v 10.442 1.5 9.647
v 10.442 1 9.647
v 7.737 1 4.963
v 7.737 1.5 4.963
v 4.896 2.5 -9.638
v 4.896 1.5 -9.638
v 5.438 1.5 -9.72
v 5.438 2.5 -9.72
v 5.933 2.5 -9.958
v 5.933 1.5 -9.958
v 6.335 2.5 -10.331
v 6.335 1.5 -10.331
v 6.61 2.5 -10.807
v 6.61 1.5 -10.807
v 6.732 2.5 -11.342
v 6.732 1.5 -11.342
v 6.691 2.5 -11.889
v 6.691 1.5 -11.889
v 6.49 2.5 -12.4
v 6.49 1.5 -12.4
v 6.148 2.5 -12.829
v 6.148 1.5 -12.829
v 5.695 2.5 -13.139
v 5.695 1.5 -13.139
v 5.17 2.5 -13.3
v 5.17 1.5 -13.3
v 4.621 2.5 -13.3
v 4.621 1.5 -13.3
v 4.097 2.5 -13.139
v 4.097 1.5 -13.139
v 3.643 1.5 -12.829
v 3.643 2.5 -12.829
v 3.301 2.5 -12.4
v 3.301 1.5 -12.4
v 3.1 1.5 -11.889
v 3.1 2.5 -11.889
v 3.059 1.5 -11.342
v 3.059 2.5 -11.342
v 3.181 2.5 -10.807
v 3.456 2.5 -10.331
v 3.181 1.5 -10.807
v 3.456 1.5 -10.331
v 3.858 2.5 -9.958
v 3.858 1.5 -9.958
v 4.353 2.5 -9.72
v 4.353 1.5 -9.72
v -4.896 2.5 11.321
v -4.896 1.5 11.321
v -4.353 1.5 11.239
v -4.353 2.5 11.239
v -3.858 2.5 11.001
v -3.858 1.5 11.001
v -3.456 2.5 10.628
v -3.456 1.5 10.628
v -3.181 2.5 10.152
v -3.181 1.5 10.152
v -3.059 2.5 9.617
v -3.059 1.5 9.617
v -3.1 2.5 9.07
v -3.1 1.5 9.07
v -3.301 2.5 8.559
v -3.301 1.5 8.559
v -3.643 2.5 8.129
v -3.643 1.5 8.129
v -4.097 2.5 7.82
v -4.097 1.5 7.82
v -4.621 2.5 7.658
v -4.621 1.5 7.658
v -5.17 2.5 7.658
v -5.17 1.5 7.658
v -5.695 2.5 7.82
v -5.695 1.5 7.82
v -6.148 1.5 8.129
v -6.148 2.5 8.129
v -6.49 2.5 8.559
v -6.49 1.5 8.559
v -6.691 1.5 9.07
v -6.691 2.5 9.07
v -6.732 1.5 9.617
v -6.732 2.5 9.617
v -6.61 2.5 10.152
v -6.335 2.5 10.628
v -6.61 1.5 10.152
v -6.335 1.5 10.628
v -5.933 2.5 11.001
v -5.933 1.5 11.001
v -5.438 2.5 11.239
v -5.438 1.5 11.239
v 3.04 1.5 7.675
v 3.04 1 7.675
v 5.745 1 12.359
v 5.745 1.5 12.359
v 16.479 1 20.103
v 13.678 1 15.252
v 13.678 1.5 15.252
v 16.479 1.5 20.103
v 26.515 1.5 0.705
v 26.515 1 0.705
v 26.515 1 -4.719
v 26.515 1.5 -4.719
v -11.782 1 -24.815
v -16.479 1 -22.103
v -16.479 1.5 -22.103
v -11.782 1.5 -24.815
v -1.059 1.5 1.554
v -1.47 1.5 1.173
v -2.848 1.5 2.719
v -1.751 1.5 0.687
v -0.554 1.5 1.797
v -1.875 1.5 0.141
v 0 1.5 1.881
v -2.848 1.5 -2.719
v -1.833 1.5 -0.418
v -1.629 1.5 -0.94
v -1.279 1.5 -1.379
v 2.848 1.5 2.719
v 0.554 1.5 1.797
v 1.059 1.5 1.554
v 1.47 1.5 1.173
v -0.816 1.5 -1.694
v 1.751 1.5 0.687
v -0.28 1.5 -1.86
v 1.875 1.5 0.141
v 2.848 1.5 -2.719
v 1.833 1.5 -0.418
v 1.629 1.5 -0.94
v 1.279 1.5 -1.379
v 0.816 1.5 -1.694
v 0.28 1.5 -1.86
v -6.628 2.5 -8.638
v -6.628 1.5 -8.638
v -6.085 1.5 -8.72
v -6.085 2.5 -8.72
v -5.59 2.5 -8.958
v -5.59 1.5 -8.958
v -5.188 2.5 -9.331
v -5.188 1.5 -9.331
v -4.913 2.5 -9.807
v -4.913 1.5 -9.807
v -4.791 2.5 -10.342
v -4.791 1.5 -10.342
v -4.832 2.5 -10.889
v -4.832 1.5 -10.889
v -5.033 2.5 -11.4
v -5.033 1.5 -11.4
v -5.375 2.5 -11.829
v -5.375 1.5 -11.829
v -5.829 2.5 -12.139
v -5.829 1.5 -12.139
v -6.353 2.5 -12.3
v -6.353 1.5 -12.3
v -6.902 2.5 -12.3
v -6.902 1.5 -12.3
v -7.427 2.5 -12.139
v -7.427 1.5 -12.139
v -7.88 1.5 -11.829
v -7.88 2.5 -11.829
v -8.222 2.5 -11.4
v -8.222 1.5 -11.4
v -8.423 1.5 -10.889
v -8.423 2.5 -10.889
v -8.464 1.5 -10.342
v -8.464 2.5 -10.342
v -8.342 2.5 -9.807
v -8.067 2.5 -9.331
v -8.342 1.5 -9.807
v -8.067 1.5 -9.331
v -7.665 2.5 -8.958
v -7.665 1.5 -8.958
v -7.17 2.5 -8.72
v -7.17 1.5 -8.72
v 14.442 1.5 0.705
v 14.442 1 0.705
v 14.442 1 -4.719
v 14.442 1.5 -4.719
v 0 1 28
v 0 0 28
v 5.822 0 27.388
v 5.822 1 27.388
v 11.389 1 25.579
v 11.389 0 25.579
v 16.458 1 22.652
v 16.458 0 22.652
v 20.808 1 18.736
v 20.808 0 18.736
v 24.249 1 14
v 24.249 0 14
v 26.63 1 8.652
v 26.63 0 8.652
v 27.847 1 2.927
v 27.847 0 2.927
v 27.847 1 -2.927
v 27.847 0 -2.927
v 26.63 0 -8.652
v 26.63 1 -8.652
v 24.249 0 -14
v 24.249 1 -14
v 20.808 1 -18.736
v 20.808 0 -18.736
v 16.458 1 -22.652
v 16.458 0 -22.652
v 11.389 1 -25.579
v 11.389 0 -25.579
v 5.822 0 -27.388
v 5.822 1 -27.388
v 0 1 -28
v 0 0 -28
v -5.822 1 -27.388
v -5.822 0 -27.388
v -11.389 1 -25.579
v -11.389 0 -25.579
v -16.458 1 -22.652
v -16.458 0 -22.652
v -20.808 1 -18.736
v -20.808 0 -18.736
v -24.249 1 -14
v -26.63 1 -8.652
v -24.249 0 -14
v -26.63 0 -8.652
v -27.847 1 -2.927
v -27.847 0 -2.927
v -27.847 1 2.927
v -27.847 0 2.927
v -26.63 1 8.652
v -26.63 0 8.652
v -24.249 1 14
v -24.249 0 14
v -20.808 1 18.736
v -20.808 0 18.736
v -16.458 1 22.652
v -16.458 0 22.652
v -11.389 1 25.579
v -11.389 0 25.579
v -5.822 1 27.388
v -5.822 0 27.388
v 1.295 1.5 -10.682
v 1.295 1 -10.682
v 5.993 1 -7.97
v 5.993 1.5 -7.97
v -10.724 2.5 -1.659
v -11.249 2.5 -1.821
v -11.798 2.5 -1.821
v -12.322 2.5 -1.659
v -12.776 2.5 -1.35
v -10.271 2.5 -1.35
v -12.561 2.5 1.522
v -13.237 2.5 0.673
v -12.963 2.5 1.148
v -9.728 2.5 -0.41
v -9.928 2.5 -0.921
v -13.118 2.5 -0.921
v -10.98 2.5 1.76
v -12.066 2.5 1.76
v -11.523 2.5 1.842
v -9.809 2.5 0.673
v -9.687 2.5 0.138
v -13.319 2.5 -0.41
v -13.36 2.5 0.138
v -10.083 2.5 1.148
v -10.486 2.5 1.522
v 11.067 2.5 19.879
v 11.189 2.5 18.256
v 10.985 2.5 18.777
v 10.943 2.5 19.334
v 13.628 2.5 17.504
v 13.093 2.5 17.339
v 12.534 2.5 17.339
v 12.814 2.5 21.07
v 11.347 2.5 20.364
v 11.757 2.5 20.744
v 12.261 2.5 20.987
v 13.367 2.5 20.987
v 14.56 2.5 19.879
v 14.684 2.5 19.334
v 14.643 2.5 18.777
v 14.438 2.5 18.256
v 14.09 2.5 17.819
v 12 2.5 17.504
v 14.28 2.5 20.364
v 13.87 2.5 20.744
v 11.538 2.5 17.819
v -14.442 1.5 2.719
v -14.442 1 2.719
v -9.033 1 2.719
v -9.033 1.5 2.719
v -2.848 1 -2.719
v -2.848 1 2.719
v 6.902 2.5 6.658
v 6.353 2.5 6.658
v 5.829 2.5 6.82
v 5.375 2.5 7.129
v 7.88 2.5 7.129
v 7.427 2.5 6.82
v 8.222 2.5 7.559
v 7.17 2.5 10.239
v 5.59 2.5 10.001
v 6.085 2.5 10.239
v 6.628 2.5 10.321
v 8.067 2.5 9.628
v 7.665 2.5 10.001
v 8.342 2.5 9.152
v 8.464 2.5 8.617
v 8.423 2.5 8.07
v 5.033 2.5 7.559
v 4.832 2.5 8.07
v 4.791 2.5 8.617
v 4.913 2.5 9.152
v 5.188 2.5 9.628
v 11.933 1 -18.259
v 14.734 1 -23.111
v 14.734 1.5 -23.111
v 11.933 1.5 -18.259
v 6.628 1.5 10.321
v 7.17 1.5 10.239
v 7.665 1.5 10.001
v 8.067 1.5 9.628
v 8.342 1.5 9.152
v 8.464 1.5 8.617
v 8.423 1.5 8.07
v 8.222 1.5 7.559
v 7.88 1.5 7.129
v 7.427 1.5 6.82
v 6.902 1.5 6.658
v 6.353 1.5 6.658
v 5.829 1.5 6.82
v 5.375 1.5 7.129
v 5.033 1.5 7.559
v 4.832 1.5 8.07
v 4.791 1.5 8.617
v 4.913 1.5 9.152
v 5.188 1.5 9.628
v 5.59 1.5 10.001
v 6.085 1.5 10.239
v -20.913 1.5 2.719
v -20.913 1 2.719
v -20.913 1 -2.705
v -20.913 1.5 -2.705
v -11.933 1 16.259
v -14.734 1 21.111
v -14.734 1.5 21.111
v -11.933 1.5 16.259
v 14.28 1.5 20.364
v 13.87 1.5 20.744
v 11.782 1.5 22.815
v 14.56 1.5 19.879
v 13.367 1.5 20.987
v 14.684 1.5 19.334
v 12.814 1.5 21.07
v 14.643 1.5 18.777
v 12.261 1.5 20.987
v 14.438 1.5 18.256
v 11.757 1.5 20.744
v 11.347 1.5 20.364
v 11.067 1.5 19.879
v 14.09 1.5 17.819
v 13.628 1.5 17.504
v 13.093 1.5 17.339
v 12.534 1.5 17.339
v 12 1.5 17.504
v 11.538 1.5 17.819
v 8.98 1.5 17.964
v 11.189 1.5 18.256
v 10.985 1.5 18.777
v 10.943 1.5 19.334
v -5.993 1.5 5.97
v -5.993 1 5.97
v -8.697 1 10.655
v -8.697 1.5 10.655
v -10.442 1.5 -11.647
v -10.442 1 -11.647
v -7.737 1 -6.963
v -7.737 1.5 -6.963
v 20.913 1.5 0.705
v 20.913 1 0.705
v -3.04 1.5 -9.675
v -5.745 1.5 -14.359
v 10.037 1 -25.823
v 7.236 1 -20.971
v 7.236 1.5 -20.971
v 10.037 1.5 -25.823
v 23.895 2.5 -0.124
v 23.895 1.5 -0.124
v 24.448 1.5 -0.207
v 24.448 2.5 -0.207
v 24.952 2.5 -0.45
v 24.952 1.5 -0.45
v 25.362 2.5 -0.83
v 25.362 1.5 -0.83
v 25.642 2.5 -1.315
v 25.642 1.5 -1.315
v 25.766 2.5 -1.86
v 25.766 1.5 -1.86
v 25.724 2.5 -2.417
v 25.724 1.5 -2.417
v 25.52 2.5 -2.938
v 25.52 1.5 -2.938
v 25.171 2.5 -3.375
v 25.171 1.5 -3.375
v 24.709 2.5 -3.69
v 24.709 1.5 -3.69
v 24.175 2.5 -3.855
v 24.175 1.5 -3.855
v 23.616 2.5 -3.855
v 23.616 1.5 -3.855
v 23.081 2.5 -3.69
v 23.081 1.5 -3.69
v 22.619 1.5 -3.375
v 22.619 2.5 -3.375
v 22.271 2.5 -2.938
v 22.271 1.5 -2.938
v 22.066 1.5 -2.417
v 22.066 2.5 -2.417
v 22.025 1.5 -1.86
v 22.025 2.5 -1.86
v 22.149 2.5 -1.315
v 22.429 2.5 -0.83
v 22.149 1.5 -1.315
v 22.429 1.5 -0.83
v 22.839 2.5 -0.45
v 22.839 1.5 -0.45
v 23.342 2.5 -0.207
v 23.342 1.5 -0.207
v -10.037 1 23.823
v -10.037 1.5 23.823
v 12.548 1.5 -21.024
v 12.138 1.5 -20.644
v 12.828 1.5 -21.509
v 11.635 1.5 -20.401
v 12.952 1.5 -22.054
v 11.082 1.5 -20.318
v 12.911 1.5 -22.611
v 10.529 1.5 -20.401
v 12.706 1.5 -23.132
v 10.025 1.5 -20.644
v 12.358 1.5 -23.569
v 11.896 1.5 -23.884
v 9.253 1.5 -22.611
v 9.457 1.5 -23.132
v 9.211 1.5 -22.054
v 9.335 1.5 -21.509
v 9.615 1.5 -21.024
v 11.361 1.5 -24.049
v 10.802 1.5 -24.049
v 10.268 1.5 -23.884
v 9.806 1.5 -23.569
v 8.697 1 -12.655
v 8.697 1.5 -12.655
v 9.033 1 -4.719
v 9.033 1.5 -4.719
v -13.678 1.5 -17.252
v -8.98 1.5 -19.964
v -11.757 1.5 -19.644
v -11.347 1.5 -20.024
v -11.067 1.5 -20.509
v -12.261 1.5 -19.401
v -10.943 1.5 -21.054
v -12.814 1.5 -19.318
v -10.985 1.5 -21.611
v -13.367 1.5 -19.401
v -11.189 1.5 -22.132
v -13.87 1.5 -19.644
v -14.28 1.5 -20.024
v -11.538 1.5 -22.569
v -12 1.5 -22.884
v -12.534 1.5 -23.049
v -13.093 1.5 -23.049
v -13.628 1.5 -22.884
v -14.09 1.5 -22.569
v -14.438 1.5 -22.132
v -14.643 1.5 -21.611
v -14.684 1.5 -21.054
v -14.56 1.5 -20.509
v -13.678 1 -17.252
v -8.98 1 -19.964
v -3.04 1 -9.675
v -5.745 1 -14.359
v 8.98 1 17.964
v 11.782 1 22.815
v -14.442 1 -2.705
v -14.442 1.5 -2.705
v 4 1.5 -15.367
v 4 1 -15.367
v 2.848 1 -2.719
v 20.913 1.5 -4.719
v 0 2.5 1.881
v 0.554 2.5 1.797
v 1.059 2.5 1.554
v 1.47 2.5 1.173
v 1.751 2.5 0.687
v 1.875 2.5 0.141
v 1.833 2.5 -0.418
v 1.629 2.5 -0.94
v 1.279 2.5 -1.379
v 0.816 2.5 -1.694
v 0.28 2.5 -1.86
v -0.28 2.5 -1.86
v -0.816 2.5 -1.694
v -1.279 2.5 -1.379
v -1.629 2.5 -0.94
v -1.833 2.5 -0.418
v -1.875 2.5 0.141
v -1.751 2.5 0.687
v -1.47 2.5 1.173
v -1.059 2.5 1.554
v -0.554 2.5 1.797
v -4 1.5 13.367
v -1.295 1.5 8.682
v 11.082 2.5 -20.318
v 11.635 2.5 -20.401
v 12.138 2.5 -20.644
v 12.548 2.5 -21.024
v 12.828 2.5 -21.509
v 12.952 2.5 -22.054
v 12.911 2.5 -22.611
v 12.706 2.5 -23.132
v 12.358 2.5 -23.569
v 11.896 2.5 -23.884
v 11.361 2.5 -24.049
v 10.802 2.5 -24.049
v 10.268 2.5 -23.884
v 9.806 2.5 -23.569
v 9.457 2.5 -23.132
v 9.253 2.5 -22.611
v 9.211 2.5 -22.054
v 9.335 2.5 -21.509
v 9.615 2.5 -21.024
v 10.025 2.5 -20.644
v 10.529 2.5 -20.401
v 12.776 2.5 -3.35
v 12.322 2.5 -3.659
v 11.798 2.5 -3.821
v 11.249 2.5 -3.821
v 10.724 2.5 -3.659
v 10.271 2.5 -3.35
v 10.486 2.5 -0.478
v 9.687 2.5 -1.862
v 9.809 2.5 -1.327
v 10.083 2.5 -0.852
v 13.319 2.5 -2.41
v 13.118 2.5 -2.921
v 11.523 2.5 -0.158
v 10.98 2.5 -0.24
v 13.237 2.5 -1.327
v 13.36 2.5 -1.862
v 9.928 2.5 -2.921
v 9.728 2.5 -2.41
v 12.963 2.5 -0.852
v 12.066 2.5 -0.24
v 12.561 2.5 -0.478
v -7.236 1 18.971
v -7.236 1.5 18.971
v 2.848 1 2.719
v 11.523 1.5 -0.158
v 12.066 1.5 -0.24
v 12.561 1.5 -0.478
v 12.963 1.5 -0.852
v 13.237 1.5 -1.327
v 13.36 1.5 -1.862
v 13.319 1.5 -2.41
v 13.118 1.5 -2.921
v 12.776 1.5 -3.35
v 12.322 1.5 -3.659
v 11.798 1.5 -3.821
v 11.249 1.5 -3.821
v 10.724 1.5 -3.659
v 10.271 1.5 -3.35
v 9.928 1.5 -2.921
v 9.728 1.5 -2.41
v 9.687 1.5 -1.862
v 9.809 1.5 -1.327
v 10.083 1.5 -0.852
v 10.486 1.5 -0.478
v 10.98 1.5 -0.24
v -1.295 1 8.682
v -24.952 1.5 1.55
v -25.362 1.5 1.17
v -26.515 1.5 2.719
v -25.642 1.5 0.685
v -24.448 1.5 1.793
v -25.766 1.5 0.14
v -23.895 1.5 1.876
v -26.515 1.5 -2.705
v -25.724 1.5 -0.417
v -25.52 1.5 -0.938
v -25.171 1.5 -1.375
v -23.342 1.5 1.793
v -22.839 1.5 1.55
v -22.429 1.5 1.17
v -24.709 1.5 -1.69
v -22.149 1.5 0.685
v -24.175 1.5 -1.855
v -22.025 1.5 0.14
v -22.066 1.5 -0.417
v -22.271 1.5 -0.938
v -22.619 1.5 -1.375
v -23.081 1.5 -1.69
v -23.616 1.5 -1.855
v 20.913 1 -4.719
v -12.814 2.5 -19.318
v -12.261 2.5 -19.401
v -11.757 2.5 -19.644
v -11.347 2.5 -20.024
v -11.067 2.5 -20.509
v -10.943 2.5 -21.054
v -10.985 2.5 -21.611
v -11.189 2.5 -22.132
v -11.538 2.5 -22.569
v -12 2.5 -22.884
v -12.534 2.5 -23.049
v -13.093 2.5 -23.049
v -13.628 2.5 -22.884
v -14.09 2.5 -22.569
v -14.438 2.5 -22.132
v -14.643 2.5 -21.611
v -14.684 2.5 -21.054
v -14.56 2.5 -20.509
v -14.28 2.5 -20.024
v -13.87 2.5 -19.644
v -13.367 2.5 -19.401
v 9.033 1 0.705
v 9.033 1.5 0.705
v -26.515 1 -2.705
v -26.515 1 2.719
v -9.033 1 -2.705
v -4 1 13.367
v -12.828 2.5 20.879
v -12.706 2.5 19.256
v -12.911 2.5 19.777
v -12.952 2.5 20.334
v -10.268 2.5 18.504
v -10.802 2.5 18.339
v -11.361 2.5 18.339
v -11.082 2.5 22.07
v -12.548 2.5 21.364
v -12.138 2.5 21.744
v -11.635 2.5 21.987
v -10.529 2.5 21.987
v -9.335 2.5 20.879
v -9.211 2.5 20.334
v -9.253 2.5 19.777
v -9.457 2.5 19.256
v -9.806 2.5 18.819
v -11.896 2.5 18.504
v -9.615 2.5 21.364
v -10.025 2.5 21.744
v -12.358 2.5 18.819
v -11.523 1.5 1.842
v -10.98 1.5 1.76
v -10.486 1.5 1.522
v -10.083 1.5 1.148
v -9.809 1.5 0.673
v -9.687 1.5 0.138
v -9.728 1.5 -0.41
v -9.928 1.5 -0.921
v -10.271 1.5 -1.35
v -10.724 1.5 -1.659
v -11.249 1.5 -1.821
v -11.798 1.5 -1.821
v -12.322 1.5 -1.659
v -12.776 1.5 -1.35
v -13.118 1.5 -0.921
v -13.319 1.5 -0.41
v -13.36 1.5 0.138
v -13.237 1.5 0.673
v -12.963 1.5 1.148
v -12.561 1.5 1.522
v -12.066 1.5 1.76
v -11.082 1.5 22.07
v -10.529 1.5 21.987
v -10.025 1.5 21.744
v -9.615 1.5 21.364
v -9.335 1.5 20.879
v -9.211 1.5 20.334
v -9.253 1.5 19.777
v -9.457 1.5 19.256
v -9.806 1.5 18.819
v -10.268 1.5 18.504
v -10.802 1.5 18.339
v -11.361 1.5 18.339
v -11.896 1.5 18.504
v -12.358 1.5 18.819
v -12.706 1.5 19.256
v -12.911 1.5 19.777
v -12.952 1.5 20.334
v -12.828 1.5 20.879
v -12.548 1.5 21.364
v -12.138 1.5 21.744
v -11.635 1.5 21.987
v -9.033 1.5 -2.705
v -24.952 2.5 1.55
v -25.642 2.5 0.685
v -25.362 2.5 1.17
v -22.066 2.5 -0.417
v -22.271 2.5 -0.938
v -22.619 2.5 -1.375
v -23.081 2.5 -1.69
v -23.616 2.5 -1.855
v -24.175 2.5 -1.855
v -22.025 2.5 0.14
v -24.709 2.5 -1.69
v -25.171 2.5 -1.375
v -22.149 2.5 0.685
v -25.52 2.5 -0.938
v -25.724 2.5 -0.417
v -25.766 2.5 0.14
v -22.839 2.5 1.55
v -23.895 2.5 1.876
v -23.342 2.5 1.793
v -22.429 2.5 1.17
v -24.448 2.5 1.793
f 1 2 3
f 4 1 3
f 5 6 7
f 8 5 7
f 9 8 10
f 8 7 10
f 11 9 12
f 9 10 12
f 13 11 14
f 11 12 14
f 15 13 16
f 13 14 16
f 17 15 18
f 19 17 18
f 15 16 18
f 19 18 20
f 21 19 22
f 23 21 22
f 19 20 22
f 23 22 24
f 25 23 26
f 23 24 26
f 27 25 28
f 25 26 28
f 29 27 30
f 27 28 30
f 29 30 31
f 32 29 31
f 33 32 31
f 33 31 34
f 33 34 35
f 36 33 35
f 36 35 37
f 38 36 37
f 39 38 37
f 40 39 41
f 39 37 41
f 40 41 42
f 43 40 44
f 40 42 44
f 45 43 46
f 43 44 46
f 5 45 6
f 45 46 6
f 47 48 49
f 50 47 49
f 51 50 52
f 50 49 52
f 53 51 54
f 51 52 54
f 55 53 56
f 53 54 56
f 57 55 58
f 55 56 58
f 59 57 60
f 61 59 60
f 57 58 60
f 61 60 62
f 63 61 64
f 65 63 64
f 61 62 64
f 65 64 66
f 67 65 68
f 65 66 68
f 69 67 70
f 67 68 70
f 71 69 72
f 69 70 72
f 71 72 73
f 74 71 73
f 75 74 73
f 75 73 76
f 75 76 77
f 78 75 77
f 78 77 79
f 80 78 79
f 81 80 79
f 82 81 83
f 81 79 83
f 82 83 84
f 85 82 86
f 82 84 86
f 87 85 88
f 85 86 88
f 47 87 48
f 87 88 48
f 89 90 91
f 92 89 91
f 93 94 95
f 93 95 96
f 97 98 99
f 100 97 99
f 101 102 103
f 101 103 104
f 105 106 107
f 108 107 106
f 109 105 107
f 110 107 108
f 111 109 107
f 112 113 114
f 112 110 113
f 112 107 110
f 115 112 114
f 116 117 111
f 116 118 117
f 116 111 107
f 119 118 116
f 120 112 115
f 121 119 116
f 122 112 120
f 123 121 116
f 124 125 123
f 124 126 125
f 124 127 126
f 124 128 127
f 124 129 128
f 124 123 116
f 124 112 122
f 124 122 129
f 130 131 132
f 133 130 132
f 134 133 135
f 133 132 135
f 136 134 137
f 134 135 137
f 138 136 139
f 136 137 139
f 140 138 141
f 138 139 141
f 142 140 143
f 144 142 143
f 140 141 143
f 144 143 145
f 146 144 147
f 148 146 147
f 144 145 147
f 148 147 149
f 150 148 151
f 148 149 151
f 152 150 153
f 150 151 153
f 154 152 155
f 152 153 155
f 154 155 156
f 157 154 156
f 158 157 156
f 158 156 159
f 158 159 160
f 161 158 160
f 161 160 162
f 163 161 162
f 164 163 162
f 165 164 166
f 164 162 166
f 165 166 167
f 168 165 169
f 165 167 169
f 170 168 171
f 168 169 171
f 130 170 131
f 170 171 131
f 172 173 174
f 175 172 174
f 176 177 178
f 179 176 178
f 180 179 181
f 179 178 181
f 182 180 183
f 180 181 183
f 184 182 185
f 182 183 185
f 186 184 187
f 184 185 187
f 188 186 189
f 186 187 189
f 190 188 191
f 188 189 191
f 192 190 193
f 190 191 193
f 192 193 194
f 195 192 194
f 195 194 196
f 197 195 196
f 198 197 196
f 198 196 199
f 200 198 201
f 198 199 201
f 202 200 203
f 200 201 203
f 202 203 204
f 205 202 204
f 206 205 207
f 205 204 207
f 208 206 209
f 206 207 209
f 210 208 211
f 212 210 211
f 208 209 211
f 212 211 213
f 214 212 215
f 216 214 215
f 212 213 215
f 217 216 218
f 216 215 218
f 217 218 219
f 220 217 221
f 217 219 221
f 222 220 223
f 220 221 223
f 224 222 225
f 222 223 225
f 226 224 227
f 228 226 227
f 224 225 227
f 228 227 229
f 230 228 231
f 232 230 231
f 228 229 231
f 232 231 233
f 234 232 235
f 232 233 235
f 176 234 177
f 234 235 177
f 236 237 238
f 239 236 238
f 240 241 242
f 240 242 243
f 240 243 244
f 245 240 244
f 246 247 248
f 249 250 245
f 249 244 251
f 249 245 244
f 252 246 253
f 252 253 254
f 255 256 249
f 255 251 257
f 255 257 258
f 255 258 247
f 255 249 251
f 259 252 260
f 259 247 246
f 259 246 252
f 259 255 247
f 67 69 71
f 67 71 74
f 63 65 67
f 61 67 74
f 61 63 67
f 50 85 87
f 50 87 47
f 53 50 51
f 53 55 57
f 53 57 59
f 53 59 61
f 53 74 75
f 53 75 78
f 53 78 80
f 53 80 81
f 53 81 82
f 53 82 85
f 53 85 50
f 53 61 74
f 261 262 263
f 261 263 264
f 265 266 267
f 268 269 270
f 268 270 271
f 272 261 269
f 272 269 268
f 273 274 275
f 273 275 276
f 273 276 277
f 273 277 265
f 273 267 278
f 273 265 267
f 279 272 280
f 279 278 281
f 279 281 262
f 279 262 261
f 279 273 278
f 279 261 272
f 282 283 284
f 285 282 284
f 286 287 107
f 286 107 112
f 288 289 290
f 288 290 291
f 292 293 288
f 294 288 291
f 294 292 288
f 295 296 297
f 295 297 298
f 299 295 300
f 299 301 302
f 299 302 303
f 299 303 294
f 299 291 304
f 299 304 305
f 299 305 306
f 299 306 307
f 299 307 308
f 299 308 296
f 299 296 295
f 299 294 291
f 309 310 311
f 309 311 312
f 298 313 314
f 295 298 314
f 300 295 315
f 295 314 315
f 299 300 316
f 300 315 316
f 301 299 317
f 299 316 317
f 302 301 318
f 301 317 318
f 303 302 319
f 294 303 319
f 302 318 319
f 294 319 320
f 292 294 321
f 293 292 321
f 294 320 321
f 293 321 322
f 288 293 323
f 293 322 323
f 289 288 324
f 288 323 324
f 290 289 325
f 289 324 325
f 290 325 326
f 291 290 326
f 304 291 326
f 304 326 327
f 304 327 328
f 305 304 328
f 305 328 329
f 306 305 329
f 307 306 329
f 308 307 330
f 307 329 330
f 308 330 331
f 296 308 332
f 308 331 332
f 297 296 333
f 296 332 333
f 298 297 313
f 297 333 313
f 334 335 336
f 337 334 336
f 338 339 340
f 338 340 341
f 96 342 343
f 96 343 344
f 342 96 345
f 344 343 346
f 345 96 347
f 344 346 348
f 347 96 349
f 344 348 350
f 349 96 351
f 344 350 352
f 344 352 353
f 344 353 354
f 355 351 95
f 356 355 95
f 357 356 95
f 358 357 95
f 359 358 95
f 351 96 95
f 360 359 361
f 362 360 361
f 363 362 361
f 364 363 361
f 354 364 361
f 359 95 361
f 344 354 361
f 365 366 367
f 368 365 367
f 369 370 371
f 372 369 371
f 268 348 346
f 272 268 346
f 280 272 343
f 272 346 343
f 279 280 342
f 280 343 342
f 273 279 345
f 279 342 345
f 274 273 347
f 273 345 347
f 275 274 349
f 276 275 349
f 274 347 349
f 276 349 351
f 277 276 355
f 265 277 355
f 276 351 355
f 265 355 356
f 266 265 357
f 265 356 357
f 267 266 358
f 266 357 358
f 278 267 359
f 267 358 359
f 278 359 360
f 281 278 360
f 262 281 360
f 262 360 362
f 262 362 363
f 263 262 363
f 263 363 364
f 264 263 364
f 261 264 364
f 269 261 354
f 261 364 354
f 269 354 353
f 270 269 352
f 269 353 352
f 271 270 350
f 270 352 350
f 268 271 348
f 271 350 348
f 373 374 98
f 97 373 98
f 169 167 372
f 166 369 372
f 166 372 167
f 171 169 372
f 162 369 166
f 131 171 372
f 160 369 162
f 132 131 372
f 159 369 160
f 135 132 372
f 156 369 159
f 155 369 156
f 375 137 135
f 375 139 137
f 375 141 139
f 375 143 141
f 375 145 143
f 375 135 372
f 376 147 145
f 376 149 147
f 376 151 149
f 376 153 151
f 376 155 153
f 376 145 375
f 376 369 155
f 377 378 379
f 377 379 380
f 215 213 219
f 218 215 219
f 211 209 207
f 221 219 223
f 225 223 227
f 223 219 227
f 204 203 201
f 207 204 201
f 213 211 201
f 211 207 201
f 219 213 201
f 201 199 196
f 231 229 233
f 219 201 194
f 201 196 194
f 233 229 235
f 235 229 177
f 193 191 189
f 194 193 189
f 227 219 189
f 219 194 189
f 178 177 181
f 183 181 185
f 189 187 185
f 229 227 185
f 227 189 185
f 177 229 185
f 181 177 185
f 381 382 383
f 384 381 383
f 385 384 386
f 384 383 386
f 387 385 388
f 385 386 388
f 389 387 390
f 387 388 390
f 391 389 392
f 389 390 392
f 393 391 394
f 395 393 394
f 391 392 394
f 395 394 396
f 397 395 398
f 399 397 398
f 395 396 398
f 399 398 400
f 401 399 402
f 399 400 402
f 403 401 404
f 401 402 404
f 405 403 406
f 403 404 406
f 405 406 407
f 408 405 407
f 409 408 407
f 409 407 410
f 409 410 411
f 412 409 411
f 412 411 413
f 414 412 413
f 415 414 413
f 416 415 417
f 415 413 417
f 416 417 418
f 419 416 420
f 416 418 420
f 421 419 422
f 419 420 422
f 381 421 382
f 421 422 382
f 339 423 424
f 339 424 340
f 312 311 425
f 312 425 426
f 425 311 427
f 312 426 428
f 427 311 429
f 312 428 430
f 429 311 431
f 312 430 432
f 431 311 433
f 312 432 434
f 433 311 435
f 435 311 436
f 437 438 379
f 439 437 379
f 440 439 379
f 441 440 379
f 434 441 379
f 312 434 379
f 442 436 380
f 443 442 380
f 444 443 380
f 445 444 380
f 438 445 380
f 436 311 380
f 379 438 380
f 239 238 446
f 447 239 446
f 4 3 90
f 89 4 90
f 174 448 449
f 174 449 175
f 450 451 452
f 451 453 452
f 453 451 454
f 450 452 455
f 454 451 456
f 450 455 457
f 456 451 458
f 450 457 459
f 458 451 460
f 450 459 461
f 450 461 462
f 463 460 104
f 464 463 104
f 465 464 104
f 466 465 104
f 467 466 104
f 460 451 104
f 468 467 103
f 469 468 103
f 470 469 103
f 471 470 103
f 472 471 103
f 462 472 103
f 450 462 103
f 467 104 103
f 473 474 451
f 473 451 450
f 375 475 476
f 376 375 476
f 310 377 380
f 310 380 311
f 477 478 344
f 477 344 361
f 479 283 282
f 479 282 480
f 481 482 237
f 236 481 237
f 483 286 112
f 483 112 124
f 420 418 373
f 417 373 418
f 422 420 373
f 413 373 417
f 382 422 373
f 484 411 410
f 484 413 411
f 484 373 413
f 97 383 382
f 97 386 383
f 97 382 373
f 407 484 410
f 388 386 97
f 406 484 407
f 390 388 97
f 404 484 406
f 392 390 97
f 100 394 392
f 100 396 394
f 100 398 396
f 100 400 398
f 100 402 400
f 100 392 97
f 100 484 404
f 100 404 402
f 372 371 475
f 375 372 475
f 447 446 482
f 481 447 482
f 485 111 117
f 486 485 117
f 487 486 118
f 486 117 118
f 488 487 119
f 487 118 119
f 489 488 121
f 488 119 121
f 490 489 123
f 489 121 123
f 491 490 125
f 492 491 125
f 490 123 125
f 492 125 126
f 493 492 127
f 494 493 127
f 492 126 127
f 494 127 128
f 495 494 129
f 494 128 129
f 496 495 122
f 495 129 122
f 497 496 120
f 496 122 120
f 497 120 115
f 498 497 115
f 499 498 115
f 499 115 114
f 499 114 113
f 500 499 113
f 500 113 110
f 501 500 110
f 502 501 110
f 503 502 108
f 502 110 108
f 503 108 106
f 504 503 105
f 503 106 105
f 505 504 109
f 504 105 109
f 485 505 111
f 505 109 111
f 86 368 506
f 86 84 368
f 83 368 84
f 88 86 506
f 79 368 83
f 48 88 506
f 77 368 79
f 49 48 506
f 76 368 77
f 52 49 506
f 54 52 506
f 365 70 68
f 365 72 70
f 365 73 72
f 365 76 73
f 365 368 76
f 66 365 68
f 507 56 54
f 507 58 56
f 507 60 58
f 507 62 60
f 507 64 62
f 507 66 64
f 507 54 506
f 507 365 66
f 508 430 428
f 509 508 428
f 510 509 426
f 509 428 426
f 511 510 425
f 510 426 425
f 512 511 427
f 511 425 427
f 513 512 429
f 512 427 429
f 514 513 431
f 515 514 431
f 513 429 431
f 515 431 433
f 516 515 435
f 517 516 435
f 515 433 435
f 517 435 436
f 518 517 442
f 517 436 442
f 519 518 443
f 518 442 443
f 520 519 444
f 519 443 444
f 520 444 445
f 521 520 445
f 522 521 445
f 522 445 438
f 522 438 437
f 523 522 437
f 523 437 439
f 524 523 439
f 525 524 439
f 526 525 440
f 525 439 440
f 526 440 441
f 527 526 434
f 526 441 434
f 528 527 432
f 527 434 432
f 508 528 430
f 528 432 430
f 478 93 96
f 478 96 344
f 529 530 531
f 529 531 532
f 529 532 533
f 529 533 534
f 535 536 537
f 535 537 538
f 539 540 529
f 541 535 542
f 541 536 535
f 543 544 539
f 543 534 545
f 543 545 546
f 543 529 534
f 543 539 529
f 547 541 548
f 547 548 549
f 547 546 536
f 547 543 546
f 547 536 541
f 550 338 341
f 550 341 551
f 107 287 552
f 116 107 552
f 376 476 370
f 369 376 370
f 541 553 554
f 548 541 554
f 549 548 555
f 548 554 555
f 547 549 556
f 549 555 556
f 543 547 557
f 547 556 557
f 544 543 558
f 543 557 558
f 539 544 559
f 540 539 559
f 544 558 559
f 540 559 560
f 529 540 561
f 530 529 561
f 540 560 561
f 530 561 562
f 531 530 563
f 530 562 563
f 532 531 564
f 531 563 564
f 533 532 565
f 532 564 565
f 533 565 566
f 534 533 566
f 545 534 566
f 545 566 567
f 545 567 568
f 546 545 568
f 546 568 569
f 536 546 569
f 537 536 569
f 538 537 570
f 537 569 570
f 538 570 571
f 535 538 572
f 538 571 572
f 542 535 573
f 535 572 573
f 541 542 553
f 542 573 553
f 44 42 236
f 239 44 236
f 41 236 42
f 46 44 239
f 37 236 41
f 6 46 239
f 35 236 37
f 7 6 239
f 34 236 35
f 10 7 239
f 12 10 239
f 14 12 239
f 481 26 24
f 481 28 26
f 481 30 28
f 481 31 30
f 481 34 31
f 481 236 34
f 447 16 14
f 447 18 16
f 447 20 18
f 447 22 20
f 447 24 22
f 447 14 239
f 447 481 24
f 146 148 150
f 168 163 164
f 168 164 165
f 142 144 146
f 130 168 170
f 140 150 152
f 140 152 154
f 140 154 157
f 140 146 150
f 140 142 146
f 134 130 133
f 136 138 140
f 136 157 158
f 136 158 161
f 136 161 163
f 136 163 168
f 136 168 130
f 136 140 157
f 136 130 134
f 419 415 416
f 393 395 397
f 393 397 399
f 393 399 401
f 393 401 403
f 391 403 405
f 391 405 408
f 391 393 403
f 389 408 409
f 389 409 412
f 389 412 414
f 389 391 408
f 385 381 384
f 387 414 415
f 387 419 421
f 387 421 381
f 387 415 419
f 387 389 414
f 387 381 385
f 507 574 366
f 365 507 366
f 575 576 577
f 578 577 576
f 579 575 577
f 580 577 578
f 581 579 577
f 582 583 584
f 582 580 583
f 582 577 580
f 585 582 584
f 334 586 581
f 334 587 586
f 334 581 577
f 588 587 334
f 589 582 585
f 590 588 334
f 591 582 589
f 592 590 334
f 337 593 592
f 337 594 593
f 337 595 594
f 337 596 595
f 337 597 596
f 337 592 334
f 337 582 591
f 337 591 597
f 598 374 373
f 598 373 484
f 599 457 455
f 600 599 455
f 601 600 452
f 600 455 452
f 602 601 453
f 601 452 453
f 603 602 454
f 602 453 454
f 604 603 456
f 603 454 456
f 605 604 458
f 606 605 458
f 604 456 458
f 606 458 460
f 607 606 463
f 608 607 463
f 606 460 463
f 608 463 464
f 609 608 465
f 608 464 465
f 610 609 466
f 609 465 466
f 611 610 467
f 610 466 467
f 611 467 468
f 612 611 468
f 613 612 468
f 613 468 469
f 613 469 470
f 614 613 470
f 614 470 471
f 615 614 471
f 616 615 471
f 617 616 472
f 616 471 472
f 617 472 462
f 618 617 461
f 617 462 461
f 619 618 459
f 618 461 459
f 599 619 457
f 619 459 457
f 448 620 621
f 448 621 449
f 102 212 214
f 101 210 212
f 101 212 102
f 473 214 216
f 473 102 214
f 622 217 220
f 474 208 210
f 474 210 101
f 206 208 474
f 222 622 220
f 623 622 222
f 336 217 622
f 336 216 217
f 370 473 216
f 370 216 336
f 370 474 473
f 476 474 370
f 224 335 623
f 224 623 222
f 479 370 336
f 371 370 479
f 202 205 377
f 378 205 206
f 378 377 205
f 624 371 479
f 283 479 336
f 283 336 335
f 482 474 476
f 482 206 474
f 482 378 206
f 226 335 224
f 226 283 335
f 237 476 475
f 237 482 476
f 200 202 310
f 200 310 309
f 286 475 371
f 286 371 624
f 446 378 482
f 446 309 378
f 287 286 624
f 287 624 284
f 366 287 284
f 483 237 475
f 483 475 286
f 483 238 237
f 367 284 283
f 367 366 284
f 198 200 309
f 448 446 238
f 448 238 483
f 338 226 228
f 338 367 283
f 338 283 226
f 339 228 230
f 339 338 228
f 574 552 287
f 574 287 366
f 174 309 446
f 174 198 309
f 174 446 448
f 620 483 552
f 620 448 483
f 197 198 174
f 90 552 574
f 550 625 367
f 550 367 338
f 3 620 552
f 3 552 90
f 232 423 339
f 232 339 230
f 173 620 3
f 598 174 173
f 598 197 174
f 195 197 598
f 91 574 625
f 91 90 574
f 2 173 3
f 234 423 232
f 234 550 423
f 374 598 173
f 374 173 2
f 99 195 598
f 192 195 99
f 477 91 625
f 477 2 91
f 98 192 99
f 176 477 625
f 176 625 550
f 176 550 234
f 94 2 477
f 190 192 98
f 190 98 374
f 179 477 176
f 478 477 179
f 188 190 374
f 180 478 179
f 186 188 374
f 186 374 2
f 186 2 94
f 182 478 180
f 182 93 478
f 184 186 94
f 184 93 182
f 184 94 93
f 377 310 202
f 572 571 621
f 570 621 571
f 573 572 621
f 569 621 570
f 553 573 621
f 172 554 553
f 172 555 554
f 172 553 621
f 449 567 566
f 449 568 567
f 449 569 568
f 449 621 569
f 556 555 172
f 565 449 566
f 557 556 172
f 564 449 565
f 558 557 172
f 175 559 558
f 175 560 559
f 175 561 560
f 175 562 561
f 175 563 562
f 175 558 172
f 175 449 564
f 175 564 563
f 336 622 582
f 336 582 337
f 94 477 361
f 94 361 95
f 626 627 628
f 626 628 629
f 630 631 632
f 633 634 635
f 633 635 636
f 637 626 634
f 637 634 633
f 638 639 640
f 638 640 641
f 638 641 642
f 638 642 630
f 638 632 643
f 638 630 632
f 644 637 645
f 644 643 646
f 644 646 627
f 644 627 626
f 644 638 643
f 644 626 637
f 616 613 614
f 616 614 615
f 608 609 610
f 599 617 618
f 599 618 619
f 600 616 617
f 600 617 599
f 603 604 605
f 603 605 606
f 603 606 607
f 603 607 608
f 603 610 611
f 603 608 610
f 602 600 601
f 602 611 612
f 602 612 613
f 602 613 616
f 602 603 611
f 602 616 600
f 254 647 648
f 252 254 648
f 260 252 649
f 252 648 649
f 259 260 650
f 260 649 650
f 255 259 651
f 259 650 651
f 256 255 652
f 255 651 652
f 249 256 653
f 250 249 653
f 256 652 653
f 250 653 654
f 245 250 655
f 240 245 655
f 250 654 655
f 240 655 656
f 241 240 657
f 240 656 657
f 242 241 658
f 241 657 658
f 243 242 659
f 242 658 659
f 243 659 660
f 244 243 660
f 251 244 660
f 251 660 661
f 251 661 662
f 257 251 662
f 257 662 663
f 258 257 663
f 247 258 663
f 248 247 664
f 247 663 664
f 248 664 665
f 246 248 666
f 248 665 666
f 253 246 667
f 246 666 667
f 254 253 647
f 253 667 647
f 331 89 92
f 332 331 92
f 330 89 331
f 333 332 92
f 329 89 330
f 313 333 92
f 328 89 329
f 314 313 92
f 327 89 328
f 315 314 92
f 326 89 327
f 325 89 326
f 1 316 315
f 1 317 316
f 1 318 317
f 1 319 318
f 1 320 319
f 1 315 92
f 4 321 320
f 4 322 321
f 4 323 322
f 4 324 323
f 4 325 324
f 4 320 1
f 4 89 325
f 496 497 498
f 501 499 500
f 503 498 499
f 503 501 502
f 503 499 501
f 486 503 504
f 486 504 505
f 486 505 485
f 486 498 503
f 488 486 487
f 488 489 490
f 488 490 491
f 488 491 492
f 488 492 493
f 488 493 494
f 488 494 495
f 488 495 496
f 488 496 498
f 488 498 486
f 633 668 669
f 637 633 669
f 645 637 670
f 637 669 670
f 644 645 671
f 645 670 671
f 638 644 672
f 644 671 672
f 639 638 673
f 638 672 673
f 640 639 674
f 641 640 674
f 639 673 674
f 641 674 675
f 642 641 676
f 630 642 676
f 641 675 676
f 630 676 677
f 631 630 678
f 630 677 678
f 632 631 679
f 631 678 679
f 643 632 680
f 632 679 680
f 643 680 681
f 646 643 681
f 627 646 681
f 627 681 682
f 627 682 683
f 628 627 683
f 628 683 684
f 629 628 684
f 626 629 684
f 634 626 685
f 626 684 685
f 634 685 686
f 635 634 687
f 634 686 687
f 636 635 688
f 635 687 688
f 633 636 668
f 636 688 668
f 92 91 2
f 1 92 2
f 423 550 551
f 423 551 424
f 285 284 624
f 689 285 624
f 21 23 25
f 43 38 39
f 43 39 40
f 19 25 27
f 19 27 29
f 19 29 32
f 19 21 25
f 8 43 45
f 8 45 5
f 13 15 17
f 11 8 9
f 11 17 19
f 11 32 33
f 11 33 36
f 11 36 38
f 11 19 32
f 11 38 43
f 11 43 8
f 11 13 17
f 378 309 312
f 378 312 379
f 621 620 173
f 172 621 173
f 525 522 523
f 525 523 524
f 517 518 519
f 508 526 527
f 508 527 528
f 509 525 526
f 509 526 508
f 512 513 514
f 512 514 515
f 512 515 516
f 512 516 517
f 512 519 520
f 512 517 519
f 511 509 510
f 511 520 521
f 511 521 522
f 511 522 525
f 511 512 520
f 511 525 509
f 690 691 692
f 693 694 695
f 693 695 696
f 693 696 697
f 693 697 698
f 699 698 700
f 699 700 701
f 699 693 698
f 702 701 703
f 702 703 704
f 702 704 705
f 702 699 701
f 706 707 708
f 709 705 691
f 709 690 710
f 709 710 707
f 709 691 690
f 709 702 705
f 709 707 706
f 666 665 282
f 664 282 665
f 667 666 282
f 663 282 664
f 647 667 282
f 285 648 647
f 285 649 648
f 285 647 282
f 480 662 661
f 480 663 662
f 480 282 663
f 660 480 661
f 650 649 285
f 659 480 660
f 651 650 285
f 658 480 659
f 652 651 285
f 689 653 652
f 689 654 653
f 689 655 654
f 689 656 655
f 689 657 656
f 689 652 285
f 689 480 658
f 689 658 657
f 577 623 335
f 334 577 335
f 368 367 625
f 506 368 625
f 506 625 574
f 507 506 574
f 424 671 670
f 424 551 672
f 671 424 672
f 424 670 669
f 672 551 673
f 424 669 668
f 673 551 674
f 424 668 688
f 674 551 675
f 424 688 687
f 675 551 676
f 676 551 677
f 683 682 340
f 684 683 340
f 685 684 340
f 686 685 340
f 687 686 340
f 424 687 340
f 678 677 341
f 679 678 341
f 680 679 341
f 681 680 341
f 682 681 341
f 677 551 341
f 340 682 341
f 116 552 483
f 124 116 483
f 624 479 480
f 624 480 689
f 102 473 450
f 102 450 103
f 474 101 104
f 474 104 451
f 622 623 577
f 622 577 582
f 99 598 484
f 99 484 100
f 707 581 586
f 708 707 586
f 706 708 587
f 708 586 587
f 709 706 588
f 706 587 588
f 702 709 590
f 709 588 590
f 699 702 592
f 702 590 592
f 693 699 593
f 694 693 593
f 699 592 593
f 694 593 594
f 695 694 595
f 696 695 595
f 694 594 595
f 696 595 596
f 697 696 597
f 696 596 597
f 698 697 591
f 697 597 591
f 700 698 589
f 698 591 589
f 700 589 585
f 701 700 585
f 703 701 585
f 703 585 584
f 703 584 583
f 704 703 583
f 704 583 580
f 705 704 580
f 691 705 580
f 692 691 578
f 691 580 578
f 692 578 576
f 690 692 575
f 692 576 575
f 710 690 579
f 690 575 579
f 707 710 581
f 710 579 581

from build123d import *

# Parameters (mm, degrees)
SKETCH1_R           = 28
BOSS_EXTRUDE1_DEPTH = 1
SKETCH2_W           = 5.602179168
SKETCH2_H           = 5.423853163
SKETCH2_W_2         = 5.409000575
SKETCH2_W_3         = 5.69543838
SKETCH2_H_2         = 5.43870575
BOSS_EXTRUDE3_DEPTH = 0.5
SKETCH3_R           = 1.87600115
SKETCH3_R_2         = 1.841544929
SKETCH3_R_3         = 1.880605589
BOSS_EXTRUDE4_DEPTH = 1


with BuildPart() as part:
    # Sketch1 → Boss-Extrude1 (new body)
    with BuildSketch(Plane(origin=(0, 0, 0), x_dir=(1, 0, 0), z_dir=(0, 1, 0))):
        with Locations(Location((0, 0, 0), (0, 0, 270))):
            Circle(SKETCH1_R)
    extrude(amount=BOSS_EXTRUDE1_DEPTH)

    # Sketch2 → Boss-Extrude3 (add)
    with BuildSketch(Plane(origin=(0, 1, 0), x_dir=(1, 0, 0), z_dir=(0, 1, 0))):
        Polygon((-8.980483261, 19.96365386), (-13.677677887, 17.251727279), (-16.47876747, 22.103356754), (-11.781572845, 24.815283336), align=None)
        with Locations((-23.714337206, -0.007426294)):
            Rectangle(SKETCH2_W, SKETCH2_H)
        with Locations((-11.737264504, -0.007426294)):
            Rectangle(SKETCH2_W_2, SKETCH2_H)
        Rectangle(SKETCH2_W_3, SKETCH2_H_2)
        Polygon((-10.441936471, 11.647258747), (-7.737436184, 6.96292684), (-3.040241558, 9.674853421), (-5.744741846, 14.359185329), align=None)
        Polygon((11.932764361, 18.259153573), (7.235569736, 20.971080154), (10.036659319, 25.82270963), (14.733853945, 23.110783048), align=None)
        Polygon((3.99982832, 15.366611623), (1.295328032, 10.682279715), (5.992522658, 7.970353134), (8.697022946, 12.654685041), align=None)
        with Locations((23.714337206, 2.007426294)):
            Rectangle(SKETCH2_W, SKETCH2_H)
        with Locations((11.737264504, 2.007426294)):
            Rectangle(SKETCH2_W_2, SKETCH2_H)
        Polygon((8.980483261, -17.96365386), (13.677677887, -15.251727279), (16.47876747, -20.103356754), (11.781572845, -22.815283336), align=None)
        Polygon((10.441936471, -9.647258747), (7.737436184, -4.96292684), (3.040241558, -7.674853421), (5.744741846, -12.359185329), align=None)
        Polygon((-11.932764361, -16.259153573), (-7.235569736, -18.971080154), (-10.036659319, -23.82270963), (-14.733853945, -21.110783048), align=None)
        Polygon((-3.99982832, -13.366611623), (-1.295328032, -8.682279715), (-5.992522658, -5.970353134), (-8.697022946, -10.654685041), align=None)
    extrude(amount=BOSS_EXTRUDE3_DEPTH)

    # Sketch3 → Boss-Extrude4 (add)
    with BuildSketch(Plane(origin=(0, 1.5, 0), x_dir=(1, 0, 0), z_dir=(0, 1, 0))):
        with Locations(Location((-23.895356308, 0, 0), (0, 0, 270))):
            Circle(SKETCH3_R)
        with Locations(Location((-11.523163477, 0, 0), (0, 0, 270))):
            Circle(SKETCH3_R_2)
        with Locations(Location((0, 0, 0), (0, 0, 270))):
            Circle(SKETCH3_R_3)
        with Locations(Location((-12.813703558, 21.193985595, 0), (0, 0, 270))):
            Circle(SKETCH3_R)
        with Locations(Location((-6.627607142, 10.479352303, 0), (0, 0, 270))):
            Circle(SKETCH3_R_2)
        with Locations(Location((11.08165275, 22.193985595, 0), (0, 0, 270))):
            Circle(SKETCH3_R)
        with Locations(Location((4.895556335, 11.479352303, 0), (0, 0, 270))):
            Circle(SKETCH3_R_2)
        with Locations(Location((23.895356308, 2, 0), (0, 0, 270))):
            Circle(SKETCH3_R)
        with Locations(Location((11.523163477, 2, 0), (0, 0, 270))):
            Circle(SKETCH3_R_2)
        with Locations(Location((12.813703558, -19.193985595, 0), (0, 0, 270))):
            Circle(SKETCH3_R)
        with Locations(Location((6.627607142, -8.479352303, 0), (0, 0, 270))):
            Circle(SKETCH3_R_2)
        with Locations(Location((-11.08165275, -20.193985595, 0), (0, 0, 270))):
            Circle(SKETCH3_R)
        with Locations(Location((-4.895556335, -9.479352303, 0), (0, 0, 270))):
            Circle(SKETCH3_R_2)
    extrude(amount=BOSS_EXTRUDE4_DEPTH)


solid = part.part
